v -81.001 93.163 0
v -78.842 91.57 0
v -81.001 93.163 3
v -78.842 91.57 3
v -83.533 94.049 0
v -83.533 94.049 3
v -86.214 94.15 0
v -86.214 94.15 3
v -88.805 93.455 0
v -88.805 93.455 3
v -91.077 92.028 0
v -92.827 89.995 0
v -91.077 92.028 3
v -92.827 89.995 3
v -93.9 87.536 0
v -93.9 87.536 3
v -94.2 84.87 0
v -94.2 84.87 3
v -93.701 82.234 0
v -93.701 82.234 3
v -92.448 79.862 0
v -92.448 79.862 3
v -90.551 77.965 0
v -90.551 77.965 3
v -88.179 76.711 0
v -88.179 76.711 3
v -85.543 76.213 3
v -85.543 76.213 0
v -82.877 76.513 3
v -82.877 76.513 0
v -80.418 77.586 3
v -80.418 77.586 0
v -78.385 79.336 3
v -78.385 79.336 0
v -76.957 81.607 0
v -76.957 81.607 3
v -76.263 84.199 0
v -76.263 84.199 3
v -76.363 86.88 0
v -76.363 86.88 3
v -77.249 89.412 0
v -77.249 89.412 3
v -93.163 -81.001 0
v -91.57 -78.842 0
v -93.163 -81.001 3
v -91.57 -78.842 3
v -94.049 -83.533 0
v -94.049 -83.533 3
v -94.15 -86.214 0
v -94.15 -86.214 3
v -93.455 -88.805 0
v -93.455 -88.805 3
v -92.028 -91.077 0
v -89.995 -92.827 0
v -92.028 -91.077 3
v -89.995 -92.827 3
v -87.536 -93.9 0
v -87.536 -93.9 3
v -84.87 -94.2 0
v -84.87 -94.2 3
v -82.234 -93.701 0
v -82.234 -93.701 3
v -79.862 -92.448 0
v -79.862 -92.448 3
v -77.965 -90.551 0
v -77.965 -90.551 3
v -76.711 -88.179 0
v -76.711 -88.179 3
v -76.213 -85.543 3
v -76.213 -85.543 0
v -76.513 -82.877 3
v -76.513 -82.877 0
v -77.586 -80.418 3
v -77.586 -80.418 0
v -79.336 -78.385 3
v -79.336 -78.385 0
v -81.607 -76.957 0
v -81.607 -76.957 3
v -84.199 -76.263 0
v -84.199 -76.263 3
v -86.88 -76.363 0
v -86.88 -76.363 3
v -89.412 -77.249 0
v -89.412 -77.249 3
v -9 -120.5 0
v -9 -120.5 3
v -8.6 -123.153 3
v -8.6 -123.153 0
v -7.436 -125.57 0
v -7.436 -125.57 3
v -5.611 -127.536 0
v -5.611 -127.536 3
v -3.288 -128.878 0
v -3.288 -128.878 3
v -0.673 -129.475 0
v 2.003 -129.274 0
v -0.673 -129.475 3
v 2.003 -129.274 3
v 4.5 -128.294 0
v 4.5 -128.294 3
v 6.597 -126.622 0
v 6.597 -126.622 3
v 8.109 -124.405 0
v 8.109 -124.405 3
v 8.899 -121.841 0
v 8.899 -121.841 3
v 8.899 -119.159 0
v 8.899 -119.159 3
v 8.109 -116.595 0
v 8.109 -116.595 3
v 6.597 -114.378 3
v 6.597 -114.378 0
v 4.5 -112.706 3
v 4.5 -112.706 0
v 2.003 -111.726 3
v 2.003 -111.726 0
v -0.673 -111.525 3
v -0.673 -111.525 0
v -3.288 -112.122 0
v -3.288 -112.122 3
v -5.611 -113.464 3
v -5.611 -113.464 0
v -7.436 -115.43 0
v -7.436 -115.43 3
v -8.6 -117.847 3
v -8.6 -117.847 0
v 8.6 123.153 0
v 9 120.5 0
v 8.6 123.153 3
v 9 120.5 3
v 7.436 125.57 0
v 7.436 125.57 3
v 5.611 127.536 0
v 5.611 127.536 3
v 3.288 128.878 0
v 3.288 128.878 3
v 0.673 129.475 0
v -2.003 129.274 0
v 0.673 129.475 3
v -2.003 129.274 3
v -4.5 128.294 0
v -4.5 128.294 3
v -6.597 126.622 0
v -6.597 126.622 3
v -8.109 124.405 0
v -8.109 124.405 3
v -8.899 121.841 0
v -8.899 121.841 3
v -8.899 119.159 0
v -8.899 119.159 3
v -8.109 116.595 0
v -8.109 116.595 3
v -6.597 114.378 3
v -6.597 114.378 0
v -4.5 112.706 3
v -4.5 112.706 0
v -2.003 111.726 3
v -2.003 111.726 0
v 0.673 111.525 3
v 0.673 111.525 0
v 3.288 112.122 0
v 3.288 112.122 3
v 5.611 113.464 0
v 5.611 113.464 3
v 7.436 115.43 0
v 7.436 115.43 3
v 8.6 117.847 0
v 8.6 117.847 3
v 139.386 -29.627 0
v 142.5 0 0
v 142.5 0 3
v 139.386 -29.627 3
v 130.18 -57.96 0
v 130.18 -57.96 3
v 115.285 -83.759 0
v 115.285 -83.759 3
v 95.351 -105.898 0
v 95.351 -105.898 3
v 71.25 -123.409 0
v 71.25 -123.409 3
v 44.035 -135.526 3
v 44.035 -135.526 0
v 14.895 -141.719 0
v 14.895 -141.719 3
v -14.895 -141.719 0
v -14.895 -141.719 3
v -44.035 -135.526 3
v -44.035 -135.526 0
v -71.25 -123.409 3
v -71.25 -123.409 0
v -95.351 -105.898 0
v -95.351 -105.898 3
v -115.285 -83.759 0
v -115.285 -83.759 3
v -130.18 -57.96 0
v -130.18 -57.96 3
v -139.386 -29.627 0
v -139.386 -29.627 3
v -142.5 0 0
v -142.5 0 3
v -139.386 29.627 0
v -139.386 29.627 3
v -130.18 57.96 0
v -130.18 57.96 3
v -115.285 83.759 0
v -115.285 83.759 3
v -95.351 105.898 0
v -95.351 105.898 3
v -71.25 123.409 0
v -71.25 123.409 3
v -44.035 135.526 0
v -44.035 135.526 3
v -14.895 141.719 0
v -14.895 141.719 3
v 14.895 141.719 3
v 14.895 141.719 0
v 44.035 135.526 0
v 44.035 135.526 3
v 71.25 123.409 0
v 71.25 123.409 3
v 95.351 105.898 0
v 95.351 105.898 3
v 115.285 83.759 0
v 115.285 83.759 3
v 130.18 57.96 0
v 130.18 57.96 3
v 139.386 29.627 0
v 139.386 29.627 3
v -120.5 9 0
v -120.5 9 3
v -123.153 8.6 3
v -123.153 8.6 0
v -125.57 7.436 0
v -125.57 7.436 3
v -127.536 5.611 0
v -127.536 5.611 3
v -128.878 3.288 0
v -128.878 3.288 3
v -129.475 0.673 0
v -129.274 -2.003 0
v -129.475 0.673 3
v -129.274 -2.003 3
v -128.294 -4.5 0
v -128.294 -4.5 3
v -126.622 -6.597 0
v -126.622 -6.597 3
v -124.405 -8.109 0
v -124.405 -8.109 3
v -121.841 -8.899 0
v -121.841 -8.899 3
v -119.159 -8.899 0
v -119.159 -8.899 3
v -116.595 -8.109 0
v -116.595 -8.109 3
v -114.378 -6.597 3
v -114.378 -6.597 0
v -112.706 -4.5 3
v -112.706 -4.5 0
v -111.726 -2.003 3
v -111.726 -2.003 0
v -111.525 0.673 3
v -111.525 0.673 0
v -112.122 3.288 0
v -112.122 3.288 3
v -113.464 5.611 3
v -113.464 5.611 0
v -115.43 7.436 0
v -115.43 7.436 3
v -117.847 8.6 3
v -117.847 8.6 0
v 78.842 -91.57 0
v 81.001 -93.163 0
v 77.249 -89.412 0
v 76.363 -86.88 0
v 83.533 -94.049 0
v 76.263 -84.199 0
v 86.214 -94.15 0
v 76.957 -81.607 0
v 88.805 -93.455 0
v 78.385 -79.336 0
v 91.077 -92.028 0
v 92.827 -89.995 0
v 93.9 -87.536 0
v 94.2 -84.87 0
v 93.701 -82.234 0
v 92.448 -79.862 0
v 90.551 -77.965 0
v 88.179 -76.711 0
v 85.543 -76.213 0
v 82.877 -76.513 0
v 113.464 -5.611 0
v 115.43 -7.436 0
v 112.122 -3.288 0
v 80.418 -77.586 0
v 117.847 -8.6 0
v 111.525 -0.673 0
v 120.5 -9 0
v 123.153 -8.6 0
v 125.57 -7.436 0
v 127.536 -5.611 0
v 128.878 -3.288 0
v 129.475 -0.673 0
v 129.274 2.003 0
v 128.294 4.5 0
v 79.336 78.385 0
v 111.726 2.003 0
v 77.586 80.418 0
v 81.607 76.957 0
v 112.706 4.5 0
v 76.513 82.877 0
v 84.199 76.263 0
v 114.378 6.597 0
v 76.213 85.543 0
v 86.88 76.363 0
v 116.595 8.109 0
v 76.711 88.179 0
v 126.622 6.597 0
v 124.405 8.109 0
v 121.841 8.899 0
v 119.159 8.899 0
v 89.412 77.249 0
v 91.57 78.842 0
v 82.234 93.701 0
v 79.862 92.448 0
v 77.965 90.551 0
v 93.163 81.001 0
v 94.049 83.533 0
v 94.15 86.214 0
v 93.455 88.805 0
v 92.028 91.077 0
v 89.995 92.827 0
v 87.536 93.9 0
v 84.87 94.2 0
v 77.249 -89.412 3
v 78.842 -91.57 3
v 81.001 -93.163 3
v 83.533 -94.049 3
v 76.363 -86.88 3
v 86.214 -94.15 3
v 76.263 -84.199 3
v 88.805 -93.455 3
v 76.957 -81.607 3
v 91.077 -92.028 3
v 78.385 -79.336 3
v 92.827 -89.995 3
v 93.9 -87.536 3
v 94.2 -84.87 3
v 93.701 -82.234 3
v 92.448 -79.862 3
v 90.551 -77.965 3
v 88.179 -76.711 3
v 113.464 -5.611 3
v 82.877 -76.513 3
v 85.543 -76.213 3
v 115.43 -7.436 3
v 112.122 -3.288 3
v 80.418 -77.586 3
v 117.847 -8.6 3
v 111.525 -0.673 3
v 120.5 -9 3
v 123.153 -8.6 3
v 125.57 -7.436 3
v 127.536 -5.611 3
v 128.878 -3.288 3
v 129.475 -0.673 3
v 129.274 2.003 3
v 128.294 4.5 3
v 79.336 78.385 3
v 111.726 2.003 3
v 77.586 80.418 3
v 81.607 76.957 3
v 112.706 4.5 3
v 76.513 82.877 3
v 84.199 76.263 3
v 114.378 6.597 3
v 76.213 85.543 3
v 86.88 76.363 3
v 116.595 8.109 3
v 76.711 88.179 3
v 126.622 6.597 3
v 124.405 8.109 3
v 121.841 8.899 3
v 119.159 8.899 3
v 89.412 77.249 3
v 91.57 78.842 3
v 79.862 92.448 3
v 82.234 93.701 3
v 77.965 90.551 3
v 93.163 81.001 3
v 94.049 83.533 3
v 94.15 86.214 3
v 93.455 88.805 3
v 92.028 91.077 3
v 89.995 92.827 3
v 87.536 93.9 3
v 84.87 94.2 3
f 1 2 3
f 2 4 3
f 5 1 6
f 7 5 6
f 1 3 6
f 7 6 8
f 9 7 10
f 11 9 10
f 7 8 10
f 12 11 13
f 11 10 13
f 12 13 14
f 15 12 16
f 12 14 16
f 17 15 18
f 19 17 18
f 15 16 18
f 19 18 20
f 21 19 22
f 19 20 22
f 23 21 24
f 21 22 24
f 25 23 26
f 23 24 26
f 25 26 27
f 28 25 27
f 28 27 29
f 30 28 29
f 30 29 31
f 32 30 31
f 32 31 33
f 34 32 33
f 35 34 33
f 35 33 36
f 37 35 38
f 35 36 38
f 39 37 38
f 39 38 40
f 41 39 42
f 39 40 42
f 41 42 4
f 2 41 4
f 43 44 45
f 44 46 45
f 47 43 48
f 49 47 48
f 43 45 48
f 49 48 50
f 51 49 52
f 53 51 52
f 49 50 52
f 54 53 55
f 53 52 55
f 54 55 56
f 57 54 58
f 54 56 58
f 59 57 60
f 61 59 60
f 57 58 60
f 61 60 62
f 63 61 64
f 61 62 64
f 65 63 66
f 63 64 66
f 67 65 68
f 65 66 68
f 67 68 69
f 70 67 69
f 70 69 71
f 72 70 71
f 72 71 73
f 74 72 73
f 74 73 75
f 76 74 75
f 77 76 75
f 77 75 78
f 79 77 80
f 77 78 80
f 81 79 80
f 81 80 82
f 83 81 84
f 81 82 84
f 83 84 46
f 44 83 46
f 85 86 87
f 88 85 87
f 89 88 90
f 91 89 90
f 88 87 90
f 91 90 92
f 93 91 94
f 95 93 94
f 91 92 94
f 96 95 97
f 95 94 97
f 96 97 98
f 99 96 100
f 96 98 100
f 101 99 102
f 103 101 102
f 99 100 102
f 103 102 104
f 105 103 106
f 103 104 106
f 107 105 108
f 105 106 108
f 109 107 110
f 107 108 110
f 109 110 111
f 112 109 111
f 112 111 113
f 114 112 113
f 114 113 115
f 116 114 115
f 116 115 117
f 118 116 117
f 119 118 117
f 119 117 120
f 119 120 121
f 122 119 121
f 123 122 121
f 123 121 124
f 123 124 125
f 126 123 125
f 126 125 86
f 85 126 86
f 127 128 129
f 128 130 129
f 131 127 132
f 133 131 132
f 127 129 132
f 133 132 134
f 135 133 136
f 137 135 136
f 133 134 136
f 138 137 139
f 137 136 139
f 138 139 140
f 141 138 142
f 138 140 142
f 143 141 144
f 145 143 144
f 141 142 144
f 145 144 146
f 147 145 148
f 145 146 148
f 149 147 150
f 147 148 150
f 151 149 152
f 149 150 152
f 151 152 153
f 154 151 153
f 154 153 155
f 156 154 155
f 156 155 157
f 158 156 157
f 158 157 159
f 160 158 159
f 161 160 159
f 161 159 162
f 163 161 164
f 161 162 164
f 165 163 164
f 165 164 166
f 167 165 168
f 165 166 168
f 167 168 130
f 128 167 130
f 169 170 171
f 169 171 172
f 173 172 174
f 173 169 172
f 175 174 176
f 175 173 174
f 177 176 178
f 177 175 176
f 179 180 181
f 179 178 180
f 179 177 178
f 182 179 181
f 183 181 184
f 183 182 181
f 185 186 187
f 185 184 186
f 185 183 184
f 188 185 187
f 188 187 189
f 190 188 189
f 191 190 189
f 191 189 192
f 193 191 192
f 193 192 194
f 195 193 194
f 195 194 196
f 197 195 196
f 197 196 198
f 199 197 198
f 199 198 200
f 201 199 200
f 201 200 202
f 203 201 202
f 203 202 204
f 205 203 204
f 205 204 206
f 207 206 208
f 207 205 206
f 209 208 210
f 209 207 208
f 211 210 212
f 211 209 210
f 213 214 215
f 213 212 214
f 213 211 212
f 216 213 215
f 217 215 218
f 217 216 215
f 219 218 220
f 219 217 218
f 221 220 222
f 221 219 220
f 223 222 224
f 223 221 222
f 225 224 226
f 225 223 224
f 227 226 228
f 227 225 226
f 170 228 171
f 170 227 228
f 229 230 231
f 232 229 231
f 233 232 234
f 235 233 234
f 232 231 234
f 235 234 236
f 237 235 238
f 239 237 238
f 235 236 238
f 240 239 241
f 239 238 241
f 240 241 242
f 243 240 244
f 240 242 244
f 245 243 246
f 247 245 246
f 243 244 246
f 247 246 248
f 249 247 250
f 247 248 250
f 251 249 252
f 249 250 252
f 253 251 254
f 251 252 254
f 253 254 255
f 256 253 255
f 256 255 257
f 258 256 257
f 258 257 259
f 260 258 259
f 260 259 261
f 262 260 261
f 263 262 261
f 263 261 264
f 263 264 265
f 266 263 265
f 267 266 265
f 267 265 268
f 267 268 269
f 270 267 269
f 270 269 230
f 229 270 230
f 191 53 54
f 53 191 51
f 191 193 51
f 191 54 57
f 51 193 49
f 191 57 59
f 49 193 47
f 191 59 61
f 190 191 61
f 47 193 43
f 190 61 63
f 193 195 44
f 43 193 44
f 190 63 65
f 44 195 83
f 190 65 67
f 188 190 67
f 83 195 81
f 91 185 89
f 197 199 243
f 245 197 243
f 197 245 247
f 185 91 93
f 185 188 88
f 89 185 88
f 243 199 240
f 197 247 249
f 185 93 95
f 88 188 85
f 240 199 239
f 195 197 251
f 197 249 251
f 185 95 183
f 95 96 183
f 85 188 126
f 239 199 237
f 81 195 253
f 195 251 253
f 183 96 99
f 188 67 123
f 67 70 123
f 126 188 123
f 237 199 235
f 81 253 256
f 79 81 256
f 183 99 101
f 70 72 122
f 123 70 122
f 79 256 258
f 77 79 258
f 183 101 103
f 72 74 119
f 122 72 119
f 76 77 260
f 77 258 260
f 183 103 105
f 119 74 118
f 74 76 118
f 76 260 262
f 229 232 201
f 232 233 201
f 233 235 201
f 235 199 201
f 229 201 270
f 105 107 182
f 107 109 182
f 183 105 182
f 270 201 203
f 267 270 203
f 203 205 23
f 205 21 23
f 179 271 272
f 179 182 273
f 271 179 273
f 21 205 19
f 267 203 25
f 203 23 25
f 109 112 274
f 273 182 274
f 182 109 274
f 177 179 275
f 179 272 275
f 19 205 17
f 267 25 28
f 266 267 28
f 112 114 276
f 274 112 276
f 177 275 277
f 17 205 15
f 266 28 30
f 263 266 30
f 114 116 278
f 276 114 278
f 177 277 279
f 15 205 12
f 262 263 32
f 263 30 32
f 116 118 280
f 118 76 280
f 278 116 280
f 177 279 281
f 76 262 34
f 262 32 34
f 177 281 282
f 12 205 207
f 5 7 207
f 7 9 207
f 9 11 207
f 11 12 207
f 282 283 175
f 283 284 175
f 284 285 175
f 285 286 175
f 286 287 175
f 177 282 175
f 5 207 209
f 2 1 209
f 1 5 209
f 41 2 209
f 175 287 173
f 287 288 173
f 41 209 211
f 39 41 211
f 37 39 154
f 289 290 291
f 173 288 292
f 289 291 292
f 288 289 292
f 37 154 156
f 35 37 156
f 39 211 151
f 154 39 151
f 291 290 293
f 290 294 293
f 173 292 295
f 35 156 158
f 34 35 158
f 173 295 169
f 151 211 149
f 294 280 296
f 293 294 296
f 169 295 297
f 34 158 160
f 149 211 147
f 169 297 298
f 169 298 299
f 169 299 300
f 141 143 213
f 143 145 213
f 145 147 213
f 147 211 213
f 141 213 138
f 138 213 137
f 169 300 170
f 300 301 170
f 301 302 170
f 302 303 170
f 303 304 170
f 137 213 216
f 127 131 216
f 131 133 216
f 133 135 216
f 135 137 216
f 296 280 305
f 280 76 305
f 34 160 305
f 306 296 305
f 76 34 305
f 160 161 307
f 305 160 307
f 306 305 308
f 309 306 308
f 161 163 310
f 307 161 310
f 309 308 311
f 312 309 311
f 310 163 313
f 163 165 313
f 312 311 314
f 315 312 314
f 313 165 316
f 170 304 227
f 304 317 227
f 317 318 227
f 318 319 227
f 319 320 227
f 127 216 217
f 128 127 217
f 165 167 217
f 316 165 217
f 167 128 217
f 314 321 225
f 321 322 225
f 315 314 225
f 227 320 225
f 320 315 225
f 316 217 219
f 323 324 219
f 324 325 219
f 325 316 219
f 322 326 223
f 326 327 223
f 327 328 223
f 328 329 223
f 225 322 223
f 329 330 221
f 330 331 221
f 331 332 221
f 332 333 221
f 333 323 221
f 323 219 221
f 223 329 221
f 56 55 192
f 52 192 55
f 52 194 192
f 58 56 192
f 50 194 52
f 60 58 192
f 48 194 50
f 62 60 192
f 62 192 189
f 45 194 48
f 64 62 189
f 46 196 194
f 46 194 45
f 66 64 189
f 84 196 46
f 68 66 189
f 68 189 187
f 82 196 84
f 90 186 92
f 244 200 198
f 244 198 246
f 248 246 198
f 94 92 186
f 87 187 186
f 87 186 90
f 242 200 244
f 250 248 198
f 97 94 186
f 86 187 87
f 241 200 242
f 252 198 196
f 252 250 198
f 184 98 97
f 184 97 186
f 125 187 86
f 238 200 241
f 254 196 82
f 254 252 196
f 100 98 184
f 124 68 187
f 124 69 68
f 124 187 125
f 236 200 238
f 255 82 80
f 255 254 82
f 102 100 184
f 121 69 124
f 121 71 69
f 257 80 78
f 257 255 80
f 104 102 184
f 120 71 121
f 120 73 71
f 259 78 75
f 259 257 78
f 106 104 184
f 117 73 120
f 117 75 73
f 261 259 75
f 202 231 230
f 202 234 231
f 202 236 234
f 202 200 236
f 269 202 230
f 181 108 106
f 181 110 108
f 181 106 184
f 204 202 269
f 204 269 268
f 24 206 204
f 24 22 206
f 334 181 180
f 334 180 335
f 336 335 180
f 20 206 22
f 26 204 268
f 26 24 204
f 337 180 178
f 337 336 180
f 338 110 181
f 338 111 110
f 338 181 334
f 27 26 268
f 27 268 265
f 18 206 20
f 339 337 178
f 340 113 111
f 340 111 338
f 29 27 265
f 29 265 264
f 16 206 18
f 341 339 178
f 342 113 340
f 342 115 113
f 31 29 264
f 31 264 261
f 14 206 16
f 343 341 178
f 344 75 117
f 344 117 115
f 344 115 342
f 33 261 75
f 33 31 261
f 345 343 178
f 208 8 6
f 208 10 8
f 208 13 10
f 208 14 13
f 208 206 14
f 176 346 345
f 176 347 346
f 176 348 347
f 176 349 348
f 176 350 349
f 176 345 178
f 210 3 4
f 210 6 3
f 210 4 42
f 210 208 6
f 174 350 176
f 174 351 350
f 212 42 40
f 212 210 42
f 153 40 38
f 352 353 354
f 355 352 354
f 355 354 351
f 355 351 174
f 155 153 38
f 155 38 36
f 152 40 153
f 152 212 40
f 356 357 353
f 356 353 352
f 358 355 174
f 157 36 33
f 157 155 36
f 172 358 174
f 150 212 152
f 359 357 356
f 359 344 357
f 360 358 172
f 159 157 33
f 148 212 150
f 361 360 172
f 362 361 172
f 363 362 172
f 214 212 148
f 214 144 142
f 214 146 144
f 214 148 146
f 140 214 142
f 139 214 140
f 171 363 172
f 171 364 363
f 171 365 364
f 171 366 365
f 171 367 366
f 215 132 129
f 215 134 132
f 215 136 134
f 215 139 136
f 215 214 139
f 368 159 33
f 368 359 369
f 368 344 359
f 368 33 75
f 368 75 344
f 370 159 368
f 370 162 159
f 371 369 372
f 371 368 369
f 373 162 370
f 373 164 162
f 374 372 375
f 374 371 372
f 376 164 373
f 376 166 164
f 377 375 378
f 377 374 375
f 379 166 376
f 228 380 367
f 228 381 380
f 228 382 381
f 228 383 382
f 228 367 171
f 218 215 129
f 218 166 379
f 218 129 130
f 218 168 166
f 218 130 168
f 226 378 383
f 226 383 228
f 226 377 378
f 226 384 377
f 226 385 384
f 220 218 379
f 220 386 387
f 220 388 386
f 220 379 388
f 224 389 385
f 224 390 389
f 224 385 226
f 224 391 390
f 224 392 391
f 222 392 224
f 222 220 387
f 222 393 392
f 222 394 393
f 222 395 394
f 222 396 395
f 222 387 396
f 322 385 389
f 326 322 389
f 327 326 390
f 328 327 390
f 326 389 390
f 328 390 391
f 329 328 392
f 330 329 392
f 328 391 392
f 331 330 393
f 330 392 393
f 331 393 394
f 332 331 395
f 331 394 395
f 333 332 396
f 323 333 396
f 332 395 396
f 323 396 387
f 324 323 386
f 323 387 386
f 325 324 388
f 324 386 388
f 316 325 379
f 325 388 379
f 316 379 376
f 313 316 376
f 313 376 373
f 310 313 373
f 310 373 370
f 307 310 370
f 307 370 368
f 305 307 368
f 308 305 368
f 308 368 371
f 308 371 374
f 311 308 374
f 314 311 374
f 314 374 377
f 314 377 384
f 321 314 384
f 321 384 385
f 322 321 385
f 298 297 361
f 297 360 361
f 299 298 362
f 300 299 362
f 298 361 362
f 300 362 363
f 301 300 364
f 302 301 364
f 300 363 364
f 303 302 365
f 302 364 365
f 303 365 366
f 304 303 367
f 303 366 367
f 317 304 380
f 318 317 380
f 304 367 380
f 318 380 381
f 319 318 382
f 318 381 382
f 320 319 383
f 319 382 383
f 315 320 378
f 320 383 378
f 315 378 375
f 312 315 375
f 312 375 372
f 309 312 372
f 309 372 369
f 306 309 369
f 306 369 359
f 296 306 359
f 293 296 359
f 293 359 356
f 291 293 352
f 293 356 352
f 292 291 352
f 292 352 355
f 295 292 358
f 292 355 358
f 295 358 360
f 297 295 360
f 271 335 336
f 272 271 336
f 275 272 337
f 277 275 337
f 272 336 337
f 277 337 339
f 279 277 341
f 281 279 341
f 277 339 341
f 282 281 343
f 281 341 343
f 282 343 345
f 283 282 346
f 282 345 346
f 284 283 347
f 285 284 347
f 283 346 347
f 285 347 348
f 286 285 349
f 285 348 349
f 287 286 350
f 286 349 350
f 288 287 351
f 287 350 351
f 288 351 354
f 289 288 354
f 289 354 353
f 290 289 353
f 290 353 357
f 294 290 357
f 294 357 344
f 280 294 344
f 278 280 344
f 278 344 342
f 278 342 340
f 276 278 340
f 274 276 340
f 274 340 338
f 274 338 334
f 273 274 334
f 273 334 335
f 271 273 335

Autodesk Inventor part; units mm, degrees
ref_plane "YZ Plane" through (0, 0, 0) normal (1, 0, 0) x (0, 1, 0)
ref_plane "XZ Plane" through (0, 0, 0) normal (0, 1, 0) x (-1, 0, 0)
ref_plane "XY Plane" through (0, 0, 0) normal (0, 0, 1) x (1, 0, 0)
sketch "Sketch1" plane through (0, 0, 0) normal (0, 0, 1) x (1, 0, 0)
  circle A0 centre (0, 0) radius 142.5
  dimension "d22" = 285
extrude "Plate1" add sketch "Sketch1" along normal blind 3
sketch "Sketch5" plane through (0, 0, 3) normal (0, 0, 1) x (1, 0, 0)
  circle A0 centre (0, 0) radius 142.5 projected
  circle A1 centre (0, 120.5) radius 9
  circle A2 centre (0, 0) radius 120.5 construction
  dimension "d23" = 18
  dimension "d30" = 22
extrude "Cut1" cut sketch "Sketch5" against normal blind 3 contours A1
pattern_circular "Circular Pattern1" count 8 over 360 about axis through (0, 0, 0) along (0, 0, 1) of "Cut1"
equation "\"d25\" = Thickness"
equation "\"d2\" = Thickness"
equation "\"BendReliefWidth\" = Thickness"
equation "\"BendReliefDepth\" = 0.5 * Thickness"
equation "\"CornerReliefSize\" = 4 * Thickness"
equation "\"MinimumRemnant\" = 2 * Thickness"
equation "\"TransitionRadius\" = BendRadius"
equation "\"JacobiRadiusSize\" = BendRadius"
equation "\"GapSize\" = Thickness"
equation "\"Thickness\" = 3"
equation "\"BendRadius\" = 5"
properties part number "MSC 922 plug 150" material "Stainless Steel"
